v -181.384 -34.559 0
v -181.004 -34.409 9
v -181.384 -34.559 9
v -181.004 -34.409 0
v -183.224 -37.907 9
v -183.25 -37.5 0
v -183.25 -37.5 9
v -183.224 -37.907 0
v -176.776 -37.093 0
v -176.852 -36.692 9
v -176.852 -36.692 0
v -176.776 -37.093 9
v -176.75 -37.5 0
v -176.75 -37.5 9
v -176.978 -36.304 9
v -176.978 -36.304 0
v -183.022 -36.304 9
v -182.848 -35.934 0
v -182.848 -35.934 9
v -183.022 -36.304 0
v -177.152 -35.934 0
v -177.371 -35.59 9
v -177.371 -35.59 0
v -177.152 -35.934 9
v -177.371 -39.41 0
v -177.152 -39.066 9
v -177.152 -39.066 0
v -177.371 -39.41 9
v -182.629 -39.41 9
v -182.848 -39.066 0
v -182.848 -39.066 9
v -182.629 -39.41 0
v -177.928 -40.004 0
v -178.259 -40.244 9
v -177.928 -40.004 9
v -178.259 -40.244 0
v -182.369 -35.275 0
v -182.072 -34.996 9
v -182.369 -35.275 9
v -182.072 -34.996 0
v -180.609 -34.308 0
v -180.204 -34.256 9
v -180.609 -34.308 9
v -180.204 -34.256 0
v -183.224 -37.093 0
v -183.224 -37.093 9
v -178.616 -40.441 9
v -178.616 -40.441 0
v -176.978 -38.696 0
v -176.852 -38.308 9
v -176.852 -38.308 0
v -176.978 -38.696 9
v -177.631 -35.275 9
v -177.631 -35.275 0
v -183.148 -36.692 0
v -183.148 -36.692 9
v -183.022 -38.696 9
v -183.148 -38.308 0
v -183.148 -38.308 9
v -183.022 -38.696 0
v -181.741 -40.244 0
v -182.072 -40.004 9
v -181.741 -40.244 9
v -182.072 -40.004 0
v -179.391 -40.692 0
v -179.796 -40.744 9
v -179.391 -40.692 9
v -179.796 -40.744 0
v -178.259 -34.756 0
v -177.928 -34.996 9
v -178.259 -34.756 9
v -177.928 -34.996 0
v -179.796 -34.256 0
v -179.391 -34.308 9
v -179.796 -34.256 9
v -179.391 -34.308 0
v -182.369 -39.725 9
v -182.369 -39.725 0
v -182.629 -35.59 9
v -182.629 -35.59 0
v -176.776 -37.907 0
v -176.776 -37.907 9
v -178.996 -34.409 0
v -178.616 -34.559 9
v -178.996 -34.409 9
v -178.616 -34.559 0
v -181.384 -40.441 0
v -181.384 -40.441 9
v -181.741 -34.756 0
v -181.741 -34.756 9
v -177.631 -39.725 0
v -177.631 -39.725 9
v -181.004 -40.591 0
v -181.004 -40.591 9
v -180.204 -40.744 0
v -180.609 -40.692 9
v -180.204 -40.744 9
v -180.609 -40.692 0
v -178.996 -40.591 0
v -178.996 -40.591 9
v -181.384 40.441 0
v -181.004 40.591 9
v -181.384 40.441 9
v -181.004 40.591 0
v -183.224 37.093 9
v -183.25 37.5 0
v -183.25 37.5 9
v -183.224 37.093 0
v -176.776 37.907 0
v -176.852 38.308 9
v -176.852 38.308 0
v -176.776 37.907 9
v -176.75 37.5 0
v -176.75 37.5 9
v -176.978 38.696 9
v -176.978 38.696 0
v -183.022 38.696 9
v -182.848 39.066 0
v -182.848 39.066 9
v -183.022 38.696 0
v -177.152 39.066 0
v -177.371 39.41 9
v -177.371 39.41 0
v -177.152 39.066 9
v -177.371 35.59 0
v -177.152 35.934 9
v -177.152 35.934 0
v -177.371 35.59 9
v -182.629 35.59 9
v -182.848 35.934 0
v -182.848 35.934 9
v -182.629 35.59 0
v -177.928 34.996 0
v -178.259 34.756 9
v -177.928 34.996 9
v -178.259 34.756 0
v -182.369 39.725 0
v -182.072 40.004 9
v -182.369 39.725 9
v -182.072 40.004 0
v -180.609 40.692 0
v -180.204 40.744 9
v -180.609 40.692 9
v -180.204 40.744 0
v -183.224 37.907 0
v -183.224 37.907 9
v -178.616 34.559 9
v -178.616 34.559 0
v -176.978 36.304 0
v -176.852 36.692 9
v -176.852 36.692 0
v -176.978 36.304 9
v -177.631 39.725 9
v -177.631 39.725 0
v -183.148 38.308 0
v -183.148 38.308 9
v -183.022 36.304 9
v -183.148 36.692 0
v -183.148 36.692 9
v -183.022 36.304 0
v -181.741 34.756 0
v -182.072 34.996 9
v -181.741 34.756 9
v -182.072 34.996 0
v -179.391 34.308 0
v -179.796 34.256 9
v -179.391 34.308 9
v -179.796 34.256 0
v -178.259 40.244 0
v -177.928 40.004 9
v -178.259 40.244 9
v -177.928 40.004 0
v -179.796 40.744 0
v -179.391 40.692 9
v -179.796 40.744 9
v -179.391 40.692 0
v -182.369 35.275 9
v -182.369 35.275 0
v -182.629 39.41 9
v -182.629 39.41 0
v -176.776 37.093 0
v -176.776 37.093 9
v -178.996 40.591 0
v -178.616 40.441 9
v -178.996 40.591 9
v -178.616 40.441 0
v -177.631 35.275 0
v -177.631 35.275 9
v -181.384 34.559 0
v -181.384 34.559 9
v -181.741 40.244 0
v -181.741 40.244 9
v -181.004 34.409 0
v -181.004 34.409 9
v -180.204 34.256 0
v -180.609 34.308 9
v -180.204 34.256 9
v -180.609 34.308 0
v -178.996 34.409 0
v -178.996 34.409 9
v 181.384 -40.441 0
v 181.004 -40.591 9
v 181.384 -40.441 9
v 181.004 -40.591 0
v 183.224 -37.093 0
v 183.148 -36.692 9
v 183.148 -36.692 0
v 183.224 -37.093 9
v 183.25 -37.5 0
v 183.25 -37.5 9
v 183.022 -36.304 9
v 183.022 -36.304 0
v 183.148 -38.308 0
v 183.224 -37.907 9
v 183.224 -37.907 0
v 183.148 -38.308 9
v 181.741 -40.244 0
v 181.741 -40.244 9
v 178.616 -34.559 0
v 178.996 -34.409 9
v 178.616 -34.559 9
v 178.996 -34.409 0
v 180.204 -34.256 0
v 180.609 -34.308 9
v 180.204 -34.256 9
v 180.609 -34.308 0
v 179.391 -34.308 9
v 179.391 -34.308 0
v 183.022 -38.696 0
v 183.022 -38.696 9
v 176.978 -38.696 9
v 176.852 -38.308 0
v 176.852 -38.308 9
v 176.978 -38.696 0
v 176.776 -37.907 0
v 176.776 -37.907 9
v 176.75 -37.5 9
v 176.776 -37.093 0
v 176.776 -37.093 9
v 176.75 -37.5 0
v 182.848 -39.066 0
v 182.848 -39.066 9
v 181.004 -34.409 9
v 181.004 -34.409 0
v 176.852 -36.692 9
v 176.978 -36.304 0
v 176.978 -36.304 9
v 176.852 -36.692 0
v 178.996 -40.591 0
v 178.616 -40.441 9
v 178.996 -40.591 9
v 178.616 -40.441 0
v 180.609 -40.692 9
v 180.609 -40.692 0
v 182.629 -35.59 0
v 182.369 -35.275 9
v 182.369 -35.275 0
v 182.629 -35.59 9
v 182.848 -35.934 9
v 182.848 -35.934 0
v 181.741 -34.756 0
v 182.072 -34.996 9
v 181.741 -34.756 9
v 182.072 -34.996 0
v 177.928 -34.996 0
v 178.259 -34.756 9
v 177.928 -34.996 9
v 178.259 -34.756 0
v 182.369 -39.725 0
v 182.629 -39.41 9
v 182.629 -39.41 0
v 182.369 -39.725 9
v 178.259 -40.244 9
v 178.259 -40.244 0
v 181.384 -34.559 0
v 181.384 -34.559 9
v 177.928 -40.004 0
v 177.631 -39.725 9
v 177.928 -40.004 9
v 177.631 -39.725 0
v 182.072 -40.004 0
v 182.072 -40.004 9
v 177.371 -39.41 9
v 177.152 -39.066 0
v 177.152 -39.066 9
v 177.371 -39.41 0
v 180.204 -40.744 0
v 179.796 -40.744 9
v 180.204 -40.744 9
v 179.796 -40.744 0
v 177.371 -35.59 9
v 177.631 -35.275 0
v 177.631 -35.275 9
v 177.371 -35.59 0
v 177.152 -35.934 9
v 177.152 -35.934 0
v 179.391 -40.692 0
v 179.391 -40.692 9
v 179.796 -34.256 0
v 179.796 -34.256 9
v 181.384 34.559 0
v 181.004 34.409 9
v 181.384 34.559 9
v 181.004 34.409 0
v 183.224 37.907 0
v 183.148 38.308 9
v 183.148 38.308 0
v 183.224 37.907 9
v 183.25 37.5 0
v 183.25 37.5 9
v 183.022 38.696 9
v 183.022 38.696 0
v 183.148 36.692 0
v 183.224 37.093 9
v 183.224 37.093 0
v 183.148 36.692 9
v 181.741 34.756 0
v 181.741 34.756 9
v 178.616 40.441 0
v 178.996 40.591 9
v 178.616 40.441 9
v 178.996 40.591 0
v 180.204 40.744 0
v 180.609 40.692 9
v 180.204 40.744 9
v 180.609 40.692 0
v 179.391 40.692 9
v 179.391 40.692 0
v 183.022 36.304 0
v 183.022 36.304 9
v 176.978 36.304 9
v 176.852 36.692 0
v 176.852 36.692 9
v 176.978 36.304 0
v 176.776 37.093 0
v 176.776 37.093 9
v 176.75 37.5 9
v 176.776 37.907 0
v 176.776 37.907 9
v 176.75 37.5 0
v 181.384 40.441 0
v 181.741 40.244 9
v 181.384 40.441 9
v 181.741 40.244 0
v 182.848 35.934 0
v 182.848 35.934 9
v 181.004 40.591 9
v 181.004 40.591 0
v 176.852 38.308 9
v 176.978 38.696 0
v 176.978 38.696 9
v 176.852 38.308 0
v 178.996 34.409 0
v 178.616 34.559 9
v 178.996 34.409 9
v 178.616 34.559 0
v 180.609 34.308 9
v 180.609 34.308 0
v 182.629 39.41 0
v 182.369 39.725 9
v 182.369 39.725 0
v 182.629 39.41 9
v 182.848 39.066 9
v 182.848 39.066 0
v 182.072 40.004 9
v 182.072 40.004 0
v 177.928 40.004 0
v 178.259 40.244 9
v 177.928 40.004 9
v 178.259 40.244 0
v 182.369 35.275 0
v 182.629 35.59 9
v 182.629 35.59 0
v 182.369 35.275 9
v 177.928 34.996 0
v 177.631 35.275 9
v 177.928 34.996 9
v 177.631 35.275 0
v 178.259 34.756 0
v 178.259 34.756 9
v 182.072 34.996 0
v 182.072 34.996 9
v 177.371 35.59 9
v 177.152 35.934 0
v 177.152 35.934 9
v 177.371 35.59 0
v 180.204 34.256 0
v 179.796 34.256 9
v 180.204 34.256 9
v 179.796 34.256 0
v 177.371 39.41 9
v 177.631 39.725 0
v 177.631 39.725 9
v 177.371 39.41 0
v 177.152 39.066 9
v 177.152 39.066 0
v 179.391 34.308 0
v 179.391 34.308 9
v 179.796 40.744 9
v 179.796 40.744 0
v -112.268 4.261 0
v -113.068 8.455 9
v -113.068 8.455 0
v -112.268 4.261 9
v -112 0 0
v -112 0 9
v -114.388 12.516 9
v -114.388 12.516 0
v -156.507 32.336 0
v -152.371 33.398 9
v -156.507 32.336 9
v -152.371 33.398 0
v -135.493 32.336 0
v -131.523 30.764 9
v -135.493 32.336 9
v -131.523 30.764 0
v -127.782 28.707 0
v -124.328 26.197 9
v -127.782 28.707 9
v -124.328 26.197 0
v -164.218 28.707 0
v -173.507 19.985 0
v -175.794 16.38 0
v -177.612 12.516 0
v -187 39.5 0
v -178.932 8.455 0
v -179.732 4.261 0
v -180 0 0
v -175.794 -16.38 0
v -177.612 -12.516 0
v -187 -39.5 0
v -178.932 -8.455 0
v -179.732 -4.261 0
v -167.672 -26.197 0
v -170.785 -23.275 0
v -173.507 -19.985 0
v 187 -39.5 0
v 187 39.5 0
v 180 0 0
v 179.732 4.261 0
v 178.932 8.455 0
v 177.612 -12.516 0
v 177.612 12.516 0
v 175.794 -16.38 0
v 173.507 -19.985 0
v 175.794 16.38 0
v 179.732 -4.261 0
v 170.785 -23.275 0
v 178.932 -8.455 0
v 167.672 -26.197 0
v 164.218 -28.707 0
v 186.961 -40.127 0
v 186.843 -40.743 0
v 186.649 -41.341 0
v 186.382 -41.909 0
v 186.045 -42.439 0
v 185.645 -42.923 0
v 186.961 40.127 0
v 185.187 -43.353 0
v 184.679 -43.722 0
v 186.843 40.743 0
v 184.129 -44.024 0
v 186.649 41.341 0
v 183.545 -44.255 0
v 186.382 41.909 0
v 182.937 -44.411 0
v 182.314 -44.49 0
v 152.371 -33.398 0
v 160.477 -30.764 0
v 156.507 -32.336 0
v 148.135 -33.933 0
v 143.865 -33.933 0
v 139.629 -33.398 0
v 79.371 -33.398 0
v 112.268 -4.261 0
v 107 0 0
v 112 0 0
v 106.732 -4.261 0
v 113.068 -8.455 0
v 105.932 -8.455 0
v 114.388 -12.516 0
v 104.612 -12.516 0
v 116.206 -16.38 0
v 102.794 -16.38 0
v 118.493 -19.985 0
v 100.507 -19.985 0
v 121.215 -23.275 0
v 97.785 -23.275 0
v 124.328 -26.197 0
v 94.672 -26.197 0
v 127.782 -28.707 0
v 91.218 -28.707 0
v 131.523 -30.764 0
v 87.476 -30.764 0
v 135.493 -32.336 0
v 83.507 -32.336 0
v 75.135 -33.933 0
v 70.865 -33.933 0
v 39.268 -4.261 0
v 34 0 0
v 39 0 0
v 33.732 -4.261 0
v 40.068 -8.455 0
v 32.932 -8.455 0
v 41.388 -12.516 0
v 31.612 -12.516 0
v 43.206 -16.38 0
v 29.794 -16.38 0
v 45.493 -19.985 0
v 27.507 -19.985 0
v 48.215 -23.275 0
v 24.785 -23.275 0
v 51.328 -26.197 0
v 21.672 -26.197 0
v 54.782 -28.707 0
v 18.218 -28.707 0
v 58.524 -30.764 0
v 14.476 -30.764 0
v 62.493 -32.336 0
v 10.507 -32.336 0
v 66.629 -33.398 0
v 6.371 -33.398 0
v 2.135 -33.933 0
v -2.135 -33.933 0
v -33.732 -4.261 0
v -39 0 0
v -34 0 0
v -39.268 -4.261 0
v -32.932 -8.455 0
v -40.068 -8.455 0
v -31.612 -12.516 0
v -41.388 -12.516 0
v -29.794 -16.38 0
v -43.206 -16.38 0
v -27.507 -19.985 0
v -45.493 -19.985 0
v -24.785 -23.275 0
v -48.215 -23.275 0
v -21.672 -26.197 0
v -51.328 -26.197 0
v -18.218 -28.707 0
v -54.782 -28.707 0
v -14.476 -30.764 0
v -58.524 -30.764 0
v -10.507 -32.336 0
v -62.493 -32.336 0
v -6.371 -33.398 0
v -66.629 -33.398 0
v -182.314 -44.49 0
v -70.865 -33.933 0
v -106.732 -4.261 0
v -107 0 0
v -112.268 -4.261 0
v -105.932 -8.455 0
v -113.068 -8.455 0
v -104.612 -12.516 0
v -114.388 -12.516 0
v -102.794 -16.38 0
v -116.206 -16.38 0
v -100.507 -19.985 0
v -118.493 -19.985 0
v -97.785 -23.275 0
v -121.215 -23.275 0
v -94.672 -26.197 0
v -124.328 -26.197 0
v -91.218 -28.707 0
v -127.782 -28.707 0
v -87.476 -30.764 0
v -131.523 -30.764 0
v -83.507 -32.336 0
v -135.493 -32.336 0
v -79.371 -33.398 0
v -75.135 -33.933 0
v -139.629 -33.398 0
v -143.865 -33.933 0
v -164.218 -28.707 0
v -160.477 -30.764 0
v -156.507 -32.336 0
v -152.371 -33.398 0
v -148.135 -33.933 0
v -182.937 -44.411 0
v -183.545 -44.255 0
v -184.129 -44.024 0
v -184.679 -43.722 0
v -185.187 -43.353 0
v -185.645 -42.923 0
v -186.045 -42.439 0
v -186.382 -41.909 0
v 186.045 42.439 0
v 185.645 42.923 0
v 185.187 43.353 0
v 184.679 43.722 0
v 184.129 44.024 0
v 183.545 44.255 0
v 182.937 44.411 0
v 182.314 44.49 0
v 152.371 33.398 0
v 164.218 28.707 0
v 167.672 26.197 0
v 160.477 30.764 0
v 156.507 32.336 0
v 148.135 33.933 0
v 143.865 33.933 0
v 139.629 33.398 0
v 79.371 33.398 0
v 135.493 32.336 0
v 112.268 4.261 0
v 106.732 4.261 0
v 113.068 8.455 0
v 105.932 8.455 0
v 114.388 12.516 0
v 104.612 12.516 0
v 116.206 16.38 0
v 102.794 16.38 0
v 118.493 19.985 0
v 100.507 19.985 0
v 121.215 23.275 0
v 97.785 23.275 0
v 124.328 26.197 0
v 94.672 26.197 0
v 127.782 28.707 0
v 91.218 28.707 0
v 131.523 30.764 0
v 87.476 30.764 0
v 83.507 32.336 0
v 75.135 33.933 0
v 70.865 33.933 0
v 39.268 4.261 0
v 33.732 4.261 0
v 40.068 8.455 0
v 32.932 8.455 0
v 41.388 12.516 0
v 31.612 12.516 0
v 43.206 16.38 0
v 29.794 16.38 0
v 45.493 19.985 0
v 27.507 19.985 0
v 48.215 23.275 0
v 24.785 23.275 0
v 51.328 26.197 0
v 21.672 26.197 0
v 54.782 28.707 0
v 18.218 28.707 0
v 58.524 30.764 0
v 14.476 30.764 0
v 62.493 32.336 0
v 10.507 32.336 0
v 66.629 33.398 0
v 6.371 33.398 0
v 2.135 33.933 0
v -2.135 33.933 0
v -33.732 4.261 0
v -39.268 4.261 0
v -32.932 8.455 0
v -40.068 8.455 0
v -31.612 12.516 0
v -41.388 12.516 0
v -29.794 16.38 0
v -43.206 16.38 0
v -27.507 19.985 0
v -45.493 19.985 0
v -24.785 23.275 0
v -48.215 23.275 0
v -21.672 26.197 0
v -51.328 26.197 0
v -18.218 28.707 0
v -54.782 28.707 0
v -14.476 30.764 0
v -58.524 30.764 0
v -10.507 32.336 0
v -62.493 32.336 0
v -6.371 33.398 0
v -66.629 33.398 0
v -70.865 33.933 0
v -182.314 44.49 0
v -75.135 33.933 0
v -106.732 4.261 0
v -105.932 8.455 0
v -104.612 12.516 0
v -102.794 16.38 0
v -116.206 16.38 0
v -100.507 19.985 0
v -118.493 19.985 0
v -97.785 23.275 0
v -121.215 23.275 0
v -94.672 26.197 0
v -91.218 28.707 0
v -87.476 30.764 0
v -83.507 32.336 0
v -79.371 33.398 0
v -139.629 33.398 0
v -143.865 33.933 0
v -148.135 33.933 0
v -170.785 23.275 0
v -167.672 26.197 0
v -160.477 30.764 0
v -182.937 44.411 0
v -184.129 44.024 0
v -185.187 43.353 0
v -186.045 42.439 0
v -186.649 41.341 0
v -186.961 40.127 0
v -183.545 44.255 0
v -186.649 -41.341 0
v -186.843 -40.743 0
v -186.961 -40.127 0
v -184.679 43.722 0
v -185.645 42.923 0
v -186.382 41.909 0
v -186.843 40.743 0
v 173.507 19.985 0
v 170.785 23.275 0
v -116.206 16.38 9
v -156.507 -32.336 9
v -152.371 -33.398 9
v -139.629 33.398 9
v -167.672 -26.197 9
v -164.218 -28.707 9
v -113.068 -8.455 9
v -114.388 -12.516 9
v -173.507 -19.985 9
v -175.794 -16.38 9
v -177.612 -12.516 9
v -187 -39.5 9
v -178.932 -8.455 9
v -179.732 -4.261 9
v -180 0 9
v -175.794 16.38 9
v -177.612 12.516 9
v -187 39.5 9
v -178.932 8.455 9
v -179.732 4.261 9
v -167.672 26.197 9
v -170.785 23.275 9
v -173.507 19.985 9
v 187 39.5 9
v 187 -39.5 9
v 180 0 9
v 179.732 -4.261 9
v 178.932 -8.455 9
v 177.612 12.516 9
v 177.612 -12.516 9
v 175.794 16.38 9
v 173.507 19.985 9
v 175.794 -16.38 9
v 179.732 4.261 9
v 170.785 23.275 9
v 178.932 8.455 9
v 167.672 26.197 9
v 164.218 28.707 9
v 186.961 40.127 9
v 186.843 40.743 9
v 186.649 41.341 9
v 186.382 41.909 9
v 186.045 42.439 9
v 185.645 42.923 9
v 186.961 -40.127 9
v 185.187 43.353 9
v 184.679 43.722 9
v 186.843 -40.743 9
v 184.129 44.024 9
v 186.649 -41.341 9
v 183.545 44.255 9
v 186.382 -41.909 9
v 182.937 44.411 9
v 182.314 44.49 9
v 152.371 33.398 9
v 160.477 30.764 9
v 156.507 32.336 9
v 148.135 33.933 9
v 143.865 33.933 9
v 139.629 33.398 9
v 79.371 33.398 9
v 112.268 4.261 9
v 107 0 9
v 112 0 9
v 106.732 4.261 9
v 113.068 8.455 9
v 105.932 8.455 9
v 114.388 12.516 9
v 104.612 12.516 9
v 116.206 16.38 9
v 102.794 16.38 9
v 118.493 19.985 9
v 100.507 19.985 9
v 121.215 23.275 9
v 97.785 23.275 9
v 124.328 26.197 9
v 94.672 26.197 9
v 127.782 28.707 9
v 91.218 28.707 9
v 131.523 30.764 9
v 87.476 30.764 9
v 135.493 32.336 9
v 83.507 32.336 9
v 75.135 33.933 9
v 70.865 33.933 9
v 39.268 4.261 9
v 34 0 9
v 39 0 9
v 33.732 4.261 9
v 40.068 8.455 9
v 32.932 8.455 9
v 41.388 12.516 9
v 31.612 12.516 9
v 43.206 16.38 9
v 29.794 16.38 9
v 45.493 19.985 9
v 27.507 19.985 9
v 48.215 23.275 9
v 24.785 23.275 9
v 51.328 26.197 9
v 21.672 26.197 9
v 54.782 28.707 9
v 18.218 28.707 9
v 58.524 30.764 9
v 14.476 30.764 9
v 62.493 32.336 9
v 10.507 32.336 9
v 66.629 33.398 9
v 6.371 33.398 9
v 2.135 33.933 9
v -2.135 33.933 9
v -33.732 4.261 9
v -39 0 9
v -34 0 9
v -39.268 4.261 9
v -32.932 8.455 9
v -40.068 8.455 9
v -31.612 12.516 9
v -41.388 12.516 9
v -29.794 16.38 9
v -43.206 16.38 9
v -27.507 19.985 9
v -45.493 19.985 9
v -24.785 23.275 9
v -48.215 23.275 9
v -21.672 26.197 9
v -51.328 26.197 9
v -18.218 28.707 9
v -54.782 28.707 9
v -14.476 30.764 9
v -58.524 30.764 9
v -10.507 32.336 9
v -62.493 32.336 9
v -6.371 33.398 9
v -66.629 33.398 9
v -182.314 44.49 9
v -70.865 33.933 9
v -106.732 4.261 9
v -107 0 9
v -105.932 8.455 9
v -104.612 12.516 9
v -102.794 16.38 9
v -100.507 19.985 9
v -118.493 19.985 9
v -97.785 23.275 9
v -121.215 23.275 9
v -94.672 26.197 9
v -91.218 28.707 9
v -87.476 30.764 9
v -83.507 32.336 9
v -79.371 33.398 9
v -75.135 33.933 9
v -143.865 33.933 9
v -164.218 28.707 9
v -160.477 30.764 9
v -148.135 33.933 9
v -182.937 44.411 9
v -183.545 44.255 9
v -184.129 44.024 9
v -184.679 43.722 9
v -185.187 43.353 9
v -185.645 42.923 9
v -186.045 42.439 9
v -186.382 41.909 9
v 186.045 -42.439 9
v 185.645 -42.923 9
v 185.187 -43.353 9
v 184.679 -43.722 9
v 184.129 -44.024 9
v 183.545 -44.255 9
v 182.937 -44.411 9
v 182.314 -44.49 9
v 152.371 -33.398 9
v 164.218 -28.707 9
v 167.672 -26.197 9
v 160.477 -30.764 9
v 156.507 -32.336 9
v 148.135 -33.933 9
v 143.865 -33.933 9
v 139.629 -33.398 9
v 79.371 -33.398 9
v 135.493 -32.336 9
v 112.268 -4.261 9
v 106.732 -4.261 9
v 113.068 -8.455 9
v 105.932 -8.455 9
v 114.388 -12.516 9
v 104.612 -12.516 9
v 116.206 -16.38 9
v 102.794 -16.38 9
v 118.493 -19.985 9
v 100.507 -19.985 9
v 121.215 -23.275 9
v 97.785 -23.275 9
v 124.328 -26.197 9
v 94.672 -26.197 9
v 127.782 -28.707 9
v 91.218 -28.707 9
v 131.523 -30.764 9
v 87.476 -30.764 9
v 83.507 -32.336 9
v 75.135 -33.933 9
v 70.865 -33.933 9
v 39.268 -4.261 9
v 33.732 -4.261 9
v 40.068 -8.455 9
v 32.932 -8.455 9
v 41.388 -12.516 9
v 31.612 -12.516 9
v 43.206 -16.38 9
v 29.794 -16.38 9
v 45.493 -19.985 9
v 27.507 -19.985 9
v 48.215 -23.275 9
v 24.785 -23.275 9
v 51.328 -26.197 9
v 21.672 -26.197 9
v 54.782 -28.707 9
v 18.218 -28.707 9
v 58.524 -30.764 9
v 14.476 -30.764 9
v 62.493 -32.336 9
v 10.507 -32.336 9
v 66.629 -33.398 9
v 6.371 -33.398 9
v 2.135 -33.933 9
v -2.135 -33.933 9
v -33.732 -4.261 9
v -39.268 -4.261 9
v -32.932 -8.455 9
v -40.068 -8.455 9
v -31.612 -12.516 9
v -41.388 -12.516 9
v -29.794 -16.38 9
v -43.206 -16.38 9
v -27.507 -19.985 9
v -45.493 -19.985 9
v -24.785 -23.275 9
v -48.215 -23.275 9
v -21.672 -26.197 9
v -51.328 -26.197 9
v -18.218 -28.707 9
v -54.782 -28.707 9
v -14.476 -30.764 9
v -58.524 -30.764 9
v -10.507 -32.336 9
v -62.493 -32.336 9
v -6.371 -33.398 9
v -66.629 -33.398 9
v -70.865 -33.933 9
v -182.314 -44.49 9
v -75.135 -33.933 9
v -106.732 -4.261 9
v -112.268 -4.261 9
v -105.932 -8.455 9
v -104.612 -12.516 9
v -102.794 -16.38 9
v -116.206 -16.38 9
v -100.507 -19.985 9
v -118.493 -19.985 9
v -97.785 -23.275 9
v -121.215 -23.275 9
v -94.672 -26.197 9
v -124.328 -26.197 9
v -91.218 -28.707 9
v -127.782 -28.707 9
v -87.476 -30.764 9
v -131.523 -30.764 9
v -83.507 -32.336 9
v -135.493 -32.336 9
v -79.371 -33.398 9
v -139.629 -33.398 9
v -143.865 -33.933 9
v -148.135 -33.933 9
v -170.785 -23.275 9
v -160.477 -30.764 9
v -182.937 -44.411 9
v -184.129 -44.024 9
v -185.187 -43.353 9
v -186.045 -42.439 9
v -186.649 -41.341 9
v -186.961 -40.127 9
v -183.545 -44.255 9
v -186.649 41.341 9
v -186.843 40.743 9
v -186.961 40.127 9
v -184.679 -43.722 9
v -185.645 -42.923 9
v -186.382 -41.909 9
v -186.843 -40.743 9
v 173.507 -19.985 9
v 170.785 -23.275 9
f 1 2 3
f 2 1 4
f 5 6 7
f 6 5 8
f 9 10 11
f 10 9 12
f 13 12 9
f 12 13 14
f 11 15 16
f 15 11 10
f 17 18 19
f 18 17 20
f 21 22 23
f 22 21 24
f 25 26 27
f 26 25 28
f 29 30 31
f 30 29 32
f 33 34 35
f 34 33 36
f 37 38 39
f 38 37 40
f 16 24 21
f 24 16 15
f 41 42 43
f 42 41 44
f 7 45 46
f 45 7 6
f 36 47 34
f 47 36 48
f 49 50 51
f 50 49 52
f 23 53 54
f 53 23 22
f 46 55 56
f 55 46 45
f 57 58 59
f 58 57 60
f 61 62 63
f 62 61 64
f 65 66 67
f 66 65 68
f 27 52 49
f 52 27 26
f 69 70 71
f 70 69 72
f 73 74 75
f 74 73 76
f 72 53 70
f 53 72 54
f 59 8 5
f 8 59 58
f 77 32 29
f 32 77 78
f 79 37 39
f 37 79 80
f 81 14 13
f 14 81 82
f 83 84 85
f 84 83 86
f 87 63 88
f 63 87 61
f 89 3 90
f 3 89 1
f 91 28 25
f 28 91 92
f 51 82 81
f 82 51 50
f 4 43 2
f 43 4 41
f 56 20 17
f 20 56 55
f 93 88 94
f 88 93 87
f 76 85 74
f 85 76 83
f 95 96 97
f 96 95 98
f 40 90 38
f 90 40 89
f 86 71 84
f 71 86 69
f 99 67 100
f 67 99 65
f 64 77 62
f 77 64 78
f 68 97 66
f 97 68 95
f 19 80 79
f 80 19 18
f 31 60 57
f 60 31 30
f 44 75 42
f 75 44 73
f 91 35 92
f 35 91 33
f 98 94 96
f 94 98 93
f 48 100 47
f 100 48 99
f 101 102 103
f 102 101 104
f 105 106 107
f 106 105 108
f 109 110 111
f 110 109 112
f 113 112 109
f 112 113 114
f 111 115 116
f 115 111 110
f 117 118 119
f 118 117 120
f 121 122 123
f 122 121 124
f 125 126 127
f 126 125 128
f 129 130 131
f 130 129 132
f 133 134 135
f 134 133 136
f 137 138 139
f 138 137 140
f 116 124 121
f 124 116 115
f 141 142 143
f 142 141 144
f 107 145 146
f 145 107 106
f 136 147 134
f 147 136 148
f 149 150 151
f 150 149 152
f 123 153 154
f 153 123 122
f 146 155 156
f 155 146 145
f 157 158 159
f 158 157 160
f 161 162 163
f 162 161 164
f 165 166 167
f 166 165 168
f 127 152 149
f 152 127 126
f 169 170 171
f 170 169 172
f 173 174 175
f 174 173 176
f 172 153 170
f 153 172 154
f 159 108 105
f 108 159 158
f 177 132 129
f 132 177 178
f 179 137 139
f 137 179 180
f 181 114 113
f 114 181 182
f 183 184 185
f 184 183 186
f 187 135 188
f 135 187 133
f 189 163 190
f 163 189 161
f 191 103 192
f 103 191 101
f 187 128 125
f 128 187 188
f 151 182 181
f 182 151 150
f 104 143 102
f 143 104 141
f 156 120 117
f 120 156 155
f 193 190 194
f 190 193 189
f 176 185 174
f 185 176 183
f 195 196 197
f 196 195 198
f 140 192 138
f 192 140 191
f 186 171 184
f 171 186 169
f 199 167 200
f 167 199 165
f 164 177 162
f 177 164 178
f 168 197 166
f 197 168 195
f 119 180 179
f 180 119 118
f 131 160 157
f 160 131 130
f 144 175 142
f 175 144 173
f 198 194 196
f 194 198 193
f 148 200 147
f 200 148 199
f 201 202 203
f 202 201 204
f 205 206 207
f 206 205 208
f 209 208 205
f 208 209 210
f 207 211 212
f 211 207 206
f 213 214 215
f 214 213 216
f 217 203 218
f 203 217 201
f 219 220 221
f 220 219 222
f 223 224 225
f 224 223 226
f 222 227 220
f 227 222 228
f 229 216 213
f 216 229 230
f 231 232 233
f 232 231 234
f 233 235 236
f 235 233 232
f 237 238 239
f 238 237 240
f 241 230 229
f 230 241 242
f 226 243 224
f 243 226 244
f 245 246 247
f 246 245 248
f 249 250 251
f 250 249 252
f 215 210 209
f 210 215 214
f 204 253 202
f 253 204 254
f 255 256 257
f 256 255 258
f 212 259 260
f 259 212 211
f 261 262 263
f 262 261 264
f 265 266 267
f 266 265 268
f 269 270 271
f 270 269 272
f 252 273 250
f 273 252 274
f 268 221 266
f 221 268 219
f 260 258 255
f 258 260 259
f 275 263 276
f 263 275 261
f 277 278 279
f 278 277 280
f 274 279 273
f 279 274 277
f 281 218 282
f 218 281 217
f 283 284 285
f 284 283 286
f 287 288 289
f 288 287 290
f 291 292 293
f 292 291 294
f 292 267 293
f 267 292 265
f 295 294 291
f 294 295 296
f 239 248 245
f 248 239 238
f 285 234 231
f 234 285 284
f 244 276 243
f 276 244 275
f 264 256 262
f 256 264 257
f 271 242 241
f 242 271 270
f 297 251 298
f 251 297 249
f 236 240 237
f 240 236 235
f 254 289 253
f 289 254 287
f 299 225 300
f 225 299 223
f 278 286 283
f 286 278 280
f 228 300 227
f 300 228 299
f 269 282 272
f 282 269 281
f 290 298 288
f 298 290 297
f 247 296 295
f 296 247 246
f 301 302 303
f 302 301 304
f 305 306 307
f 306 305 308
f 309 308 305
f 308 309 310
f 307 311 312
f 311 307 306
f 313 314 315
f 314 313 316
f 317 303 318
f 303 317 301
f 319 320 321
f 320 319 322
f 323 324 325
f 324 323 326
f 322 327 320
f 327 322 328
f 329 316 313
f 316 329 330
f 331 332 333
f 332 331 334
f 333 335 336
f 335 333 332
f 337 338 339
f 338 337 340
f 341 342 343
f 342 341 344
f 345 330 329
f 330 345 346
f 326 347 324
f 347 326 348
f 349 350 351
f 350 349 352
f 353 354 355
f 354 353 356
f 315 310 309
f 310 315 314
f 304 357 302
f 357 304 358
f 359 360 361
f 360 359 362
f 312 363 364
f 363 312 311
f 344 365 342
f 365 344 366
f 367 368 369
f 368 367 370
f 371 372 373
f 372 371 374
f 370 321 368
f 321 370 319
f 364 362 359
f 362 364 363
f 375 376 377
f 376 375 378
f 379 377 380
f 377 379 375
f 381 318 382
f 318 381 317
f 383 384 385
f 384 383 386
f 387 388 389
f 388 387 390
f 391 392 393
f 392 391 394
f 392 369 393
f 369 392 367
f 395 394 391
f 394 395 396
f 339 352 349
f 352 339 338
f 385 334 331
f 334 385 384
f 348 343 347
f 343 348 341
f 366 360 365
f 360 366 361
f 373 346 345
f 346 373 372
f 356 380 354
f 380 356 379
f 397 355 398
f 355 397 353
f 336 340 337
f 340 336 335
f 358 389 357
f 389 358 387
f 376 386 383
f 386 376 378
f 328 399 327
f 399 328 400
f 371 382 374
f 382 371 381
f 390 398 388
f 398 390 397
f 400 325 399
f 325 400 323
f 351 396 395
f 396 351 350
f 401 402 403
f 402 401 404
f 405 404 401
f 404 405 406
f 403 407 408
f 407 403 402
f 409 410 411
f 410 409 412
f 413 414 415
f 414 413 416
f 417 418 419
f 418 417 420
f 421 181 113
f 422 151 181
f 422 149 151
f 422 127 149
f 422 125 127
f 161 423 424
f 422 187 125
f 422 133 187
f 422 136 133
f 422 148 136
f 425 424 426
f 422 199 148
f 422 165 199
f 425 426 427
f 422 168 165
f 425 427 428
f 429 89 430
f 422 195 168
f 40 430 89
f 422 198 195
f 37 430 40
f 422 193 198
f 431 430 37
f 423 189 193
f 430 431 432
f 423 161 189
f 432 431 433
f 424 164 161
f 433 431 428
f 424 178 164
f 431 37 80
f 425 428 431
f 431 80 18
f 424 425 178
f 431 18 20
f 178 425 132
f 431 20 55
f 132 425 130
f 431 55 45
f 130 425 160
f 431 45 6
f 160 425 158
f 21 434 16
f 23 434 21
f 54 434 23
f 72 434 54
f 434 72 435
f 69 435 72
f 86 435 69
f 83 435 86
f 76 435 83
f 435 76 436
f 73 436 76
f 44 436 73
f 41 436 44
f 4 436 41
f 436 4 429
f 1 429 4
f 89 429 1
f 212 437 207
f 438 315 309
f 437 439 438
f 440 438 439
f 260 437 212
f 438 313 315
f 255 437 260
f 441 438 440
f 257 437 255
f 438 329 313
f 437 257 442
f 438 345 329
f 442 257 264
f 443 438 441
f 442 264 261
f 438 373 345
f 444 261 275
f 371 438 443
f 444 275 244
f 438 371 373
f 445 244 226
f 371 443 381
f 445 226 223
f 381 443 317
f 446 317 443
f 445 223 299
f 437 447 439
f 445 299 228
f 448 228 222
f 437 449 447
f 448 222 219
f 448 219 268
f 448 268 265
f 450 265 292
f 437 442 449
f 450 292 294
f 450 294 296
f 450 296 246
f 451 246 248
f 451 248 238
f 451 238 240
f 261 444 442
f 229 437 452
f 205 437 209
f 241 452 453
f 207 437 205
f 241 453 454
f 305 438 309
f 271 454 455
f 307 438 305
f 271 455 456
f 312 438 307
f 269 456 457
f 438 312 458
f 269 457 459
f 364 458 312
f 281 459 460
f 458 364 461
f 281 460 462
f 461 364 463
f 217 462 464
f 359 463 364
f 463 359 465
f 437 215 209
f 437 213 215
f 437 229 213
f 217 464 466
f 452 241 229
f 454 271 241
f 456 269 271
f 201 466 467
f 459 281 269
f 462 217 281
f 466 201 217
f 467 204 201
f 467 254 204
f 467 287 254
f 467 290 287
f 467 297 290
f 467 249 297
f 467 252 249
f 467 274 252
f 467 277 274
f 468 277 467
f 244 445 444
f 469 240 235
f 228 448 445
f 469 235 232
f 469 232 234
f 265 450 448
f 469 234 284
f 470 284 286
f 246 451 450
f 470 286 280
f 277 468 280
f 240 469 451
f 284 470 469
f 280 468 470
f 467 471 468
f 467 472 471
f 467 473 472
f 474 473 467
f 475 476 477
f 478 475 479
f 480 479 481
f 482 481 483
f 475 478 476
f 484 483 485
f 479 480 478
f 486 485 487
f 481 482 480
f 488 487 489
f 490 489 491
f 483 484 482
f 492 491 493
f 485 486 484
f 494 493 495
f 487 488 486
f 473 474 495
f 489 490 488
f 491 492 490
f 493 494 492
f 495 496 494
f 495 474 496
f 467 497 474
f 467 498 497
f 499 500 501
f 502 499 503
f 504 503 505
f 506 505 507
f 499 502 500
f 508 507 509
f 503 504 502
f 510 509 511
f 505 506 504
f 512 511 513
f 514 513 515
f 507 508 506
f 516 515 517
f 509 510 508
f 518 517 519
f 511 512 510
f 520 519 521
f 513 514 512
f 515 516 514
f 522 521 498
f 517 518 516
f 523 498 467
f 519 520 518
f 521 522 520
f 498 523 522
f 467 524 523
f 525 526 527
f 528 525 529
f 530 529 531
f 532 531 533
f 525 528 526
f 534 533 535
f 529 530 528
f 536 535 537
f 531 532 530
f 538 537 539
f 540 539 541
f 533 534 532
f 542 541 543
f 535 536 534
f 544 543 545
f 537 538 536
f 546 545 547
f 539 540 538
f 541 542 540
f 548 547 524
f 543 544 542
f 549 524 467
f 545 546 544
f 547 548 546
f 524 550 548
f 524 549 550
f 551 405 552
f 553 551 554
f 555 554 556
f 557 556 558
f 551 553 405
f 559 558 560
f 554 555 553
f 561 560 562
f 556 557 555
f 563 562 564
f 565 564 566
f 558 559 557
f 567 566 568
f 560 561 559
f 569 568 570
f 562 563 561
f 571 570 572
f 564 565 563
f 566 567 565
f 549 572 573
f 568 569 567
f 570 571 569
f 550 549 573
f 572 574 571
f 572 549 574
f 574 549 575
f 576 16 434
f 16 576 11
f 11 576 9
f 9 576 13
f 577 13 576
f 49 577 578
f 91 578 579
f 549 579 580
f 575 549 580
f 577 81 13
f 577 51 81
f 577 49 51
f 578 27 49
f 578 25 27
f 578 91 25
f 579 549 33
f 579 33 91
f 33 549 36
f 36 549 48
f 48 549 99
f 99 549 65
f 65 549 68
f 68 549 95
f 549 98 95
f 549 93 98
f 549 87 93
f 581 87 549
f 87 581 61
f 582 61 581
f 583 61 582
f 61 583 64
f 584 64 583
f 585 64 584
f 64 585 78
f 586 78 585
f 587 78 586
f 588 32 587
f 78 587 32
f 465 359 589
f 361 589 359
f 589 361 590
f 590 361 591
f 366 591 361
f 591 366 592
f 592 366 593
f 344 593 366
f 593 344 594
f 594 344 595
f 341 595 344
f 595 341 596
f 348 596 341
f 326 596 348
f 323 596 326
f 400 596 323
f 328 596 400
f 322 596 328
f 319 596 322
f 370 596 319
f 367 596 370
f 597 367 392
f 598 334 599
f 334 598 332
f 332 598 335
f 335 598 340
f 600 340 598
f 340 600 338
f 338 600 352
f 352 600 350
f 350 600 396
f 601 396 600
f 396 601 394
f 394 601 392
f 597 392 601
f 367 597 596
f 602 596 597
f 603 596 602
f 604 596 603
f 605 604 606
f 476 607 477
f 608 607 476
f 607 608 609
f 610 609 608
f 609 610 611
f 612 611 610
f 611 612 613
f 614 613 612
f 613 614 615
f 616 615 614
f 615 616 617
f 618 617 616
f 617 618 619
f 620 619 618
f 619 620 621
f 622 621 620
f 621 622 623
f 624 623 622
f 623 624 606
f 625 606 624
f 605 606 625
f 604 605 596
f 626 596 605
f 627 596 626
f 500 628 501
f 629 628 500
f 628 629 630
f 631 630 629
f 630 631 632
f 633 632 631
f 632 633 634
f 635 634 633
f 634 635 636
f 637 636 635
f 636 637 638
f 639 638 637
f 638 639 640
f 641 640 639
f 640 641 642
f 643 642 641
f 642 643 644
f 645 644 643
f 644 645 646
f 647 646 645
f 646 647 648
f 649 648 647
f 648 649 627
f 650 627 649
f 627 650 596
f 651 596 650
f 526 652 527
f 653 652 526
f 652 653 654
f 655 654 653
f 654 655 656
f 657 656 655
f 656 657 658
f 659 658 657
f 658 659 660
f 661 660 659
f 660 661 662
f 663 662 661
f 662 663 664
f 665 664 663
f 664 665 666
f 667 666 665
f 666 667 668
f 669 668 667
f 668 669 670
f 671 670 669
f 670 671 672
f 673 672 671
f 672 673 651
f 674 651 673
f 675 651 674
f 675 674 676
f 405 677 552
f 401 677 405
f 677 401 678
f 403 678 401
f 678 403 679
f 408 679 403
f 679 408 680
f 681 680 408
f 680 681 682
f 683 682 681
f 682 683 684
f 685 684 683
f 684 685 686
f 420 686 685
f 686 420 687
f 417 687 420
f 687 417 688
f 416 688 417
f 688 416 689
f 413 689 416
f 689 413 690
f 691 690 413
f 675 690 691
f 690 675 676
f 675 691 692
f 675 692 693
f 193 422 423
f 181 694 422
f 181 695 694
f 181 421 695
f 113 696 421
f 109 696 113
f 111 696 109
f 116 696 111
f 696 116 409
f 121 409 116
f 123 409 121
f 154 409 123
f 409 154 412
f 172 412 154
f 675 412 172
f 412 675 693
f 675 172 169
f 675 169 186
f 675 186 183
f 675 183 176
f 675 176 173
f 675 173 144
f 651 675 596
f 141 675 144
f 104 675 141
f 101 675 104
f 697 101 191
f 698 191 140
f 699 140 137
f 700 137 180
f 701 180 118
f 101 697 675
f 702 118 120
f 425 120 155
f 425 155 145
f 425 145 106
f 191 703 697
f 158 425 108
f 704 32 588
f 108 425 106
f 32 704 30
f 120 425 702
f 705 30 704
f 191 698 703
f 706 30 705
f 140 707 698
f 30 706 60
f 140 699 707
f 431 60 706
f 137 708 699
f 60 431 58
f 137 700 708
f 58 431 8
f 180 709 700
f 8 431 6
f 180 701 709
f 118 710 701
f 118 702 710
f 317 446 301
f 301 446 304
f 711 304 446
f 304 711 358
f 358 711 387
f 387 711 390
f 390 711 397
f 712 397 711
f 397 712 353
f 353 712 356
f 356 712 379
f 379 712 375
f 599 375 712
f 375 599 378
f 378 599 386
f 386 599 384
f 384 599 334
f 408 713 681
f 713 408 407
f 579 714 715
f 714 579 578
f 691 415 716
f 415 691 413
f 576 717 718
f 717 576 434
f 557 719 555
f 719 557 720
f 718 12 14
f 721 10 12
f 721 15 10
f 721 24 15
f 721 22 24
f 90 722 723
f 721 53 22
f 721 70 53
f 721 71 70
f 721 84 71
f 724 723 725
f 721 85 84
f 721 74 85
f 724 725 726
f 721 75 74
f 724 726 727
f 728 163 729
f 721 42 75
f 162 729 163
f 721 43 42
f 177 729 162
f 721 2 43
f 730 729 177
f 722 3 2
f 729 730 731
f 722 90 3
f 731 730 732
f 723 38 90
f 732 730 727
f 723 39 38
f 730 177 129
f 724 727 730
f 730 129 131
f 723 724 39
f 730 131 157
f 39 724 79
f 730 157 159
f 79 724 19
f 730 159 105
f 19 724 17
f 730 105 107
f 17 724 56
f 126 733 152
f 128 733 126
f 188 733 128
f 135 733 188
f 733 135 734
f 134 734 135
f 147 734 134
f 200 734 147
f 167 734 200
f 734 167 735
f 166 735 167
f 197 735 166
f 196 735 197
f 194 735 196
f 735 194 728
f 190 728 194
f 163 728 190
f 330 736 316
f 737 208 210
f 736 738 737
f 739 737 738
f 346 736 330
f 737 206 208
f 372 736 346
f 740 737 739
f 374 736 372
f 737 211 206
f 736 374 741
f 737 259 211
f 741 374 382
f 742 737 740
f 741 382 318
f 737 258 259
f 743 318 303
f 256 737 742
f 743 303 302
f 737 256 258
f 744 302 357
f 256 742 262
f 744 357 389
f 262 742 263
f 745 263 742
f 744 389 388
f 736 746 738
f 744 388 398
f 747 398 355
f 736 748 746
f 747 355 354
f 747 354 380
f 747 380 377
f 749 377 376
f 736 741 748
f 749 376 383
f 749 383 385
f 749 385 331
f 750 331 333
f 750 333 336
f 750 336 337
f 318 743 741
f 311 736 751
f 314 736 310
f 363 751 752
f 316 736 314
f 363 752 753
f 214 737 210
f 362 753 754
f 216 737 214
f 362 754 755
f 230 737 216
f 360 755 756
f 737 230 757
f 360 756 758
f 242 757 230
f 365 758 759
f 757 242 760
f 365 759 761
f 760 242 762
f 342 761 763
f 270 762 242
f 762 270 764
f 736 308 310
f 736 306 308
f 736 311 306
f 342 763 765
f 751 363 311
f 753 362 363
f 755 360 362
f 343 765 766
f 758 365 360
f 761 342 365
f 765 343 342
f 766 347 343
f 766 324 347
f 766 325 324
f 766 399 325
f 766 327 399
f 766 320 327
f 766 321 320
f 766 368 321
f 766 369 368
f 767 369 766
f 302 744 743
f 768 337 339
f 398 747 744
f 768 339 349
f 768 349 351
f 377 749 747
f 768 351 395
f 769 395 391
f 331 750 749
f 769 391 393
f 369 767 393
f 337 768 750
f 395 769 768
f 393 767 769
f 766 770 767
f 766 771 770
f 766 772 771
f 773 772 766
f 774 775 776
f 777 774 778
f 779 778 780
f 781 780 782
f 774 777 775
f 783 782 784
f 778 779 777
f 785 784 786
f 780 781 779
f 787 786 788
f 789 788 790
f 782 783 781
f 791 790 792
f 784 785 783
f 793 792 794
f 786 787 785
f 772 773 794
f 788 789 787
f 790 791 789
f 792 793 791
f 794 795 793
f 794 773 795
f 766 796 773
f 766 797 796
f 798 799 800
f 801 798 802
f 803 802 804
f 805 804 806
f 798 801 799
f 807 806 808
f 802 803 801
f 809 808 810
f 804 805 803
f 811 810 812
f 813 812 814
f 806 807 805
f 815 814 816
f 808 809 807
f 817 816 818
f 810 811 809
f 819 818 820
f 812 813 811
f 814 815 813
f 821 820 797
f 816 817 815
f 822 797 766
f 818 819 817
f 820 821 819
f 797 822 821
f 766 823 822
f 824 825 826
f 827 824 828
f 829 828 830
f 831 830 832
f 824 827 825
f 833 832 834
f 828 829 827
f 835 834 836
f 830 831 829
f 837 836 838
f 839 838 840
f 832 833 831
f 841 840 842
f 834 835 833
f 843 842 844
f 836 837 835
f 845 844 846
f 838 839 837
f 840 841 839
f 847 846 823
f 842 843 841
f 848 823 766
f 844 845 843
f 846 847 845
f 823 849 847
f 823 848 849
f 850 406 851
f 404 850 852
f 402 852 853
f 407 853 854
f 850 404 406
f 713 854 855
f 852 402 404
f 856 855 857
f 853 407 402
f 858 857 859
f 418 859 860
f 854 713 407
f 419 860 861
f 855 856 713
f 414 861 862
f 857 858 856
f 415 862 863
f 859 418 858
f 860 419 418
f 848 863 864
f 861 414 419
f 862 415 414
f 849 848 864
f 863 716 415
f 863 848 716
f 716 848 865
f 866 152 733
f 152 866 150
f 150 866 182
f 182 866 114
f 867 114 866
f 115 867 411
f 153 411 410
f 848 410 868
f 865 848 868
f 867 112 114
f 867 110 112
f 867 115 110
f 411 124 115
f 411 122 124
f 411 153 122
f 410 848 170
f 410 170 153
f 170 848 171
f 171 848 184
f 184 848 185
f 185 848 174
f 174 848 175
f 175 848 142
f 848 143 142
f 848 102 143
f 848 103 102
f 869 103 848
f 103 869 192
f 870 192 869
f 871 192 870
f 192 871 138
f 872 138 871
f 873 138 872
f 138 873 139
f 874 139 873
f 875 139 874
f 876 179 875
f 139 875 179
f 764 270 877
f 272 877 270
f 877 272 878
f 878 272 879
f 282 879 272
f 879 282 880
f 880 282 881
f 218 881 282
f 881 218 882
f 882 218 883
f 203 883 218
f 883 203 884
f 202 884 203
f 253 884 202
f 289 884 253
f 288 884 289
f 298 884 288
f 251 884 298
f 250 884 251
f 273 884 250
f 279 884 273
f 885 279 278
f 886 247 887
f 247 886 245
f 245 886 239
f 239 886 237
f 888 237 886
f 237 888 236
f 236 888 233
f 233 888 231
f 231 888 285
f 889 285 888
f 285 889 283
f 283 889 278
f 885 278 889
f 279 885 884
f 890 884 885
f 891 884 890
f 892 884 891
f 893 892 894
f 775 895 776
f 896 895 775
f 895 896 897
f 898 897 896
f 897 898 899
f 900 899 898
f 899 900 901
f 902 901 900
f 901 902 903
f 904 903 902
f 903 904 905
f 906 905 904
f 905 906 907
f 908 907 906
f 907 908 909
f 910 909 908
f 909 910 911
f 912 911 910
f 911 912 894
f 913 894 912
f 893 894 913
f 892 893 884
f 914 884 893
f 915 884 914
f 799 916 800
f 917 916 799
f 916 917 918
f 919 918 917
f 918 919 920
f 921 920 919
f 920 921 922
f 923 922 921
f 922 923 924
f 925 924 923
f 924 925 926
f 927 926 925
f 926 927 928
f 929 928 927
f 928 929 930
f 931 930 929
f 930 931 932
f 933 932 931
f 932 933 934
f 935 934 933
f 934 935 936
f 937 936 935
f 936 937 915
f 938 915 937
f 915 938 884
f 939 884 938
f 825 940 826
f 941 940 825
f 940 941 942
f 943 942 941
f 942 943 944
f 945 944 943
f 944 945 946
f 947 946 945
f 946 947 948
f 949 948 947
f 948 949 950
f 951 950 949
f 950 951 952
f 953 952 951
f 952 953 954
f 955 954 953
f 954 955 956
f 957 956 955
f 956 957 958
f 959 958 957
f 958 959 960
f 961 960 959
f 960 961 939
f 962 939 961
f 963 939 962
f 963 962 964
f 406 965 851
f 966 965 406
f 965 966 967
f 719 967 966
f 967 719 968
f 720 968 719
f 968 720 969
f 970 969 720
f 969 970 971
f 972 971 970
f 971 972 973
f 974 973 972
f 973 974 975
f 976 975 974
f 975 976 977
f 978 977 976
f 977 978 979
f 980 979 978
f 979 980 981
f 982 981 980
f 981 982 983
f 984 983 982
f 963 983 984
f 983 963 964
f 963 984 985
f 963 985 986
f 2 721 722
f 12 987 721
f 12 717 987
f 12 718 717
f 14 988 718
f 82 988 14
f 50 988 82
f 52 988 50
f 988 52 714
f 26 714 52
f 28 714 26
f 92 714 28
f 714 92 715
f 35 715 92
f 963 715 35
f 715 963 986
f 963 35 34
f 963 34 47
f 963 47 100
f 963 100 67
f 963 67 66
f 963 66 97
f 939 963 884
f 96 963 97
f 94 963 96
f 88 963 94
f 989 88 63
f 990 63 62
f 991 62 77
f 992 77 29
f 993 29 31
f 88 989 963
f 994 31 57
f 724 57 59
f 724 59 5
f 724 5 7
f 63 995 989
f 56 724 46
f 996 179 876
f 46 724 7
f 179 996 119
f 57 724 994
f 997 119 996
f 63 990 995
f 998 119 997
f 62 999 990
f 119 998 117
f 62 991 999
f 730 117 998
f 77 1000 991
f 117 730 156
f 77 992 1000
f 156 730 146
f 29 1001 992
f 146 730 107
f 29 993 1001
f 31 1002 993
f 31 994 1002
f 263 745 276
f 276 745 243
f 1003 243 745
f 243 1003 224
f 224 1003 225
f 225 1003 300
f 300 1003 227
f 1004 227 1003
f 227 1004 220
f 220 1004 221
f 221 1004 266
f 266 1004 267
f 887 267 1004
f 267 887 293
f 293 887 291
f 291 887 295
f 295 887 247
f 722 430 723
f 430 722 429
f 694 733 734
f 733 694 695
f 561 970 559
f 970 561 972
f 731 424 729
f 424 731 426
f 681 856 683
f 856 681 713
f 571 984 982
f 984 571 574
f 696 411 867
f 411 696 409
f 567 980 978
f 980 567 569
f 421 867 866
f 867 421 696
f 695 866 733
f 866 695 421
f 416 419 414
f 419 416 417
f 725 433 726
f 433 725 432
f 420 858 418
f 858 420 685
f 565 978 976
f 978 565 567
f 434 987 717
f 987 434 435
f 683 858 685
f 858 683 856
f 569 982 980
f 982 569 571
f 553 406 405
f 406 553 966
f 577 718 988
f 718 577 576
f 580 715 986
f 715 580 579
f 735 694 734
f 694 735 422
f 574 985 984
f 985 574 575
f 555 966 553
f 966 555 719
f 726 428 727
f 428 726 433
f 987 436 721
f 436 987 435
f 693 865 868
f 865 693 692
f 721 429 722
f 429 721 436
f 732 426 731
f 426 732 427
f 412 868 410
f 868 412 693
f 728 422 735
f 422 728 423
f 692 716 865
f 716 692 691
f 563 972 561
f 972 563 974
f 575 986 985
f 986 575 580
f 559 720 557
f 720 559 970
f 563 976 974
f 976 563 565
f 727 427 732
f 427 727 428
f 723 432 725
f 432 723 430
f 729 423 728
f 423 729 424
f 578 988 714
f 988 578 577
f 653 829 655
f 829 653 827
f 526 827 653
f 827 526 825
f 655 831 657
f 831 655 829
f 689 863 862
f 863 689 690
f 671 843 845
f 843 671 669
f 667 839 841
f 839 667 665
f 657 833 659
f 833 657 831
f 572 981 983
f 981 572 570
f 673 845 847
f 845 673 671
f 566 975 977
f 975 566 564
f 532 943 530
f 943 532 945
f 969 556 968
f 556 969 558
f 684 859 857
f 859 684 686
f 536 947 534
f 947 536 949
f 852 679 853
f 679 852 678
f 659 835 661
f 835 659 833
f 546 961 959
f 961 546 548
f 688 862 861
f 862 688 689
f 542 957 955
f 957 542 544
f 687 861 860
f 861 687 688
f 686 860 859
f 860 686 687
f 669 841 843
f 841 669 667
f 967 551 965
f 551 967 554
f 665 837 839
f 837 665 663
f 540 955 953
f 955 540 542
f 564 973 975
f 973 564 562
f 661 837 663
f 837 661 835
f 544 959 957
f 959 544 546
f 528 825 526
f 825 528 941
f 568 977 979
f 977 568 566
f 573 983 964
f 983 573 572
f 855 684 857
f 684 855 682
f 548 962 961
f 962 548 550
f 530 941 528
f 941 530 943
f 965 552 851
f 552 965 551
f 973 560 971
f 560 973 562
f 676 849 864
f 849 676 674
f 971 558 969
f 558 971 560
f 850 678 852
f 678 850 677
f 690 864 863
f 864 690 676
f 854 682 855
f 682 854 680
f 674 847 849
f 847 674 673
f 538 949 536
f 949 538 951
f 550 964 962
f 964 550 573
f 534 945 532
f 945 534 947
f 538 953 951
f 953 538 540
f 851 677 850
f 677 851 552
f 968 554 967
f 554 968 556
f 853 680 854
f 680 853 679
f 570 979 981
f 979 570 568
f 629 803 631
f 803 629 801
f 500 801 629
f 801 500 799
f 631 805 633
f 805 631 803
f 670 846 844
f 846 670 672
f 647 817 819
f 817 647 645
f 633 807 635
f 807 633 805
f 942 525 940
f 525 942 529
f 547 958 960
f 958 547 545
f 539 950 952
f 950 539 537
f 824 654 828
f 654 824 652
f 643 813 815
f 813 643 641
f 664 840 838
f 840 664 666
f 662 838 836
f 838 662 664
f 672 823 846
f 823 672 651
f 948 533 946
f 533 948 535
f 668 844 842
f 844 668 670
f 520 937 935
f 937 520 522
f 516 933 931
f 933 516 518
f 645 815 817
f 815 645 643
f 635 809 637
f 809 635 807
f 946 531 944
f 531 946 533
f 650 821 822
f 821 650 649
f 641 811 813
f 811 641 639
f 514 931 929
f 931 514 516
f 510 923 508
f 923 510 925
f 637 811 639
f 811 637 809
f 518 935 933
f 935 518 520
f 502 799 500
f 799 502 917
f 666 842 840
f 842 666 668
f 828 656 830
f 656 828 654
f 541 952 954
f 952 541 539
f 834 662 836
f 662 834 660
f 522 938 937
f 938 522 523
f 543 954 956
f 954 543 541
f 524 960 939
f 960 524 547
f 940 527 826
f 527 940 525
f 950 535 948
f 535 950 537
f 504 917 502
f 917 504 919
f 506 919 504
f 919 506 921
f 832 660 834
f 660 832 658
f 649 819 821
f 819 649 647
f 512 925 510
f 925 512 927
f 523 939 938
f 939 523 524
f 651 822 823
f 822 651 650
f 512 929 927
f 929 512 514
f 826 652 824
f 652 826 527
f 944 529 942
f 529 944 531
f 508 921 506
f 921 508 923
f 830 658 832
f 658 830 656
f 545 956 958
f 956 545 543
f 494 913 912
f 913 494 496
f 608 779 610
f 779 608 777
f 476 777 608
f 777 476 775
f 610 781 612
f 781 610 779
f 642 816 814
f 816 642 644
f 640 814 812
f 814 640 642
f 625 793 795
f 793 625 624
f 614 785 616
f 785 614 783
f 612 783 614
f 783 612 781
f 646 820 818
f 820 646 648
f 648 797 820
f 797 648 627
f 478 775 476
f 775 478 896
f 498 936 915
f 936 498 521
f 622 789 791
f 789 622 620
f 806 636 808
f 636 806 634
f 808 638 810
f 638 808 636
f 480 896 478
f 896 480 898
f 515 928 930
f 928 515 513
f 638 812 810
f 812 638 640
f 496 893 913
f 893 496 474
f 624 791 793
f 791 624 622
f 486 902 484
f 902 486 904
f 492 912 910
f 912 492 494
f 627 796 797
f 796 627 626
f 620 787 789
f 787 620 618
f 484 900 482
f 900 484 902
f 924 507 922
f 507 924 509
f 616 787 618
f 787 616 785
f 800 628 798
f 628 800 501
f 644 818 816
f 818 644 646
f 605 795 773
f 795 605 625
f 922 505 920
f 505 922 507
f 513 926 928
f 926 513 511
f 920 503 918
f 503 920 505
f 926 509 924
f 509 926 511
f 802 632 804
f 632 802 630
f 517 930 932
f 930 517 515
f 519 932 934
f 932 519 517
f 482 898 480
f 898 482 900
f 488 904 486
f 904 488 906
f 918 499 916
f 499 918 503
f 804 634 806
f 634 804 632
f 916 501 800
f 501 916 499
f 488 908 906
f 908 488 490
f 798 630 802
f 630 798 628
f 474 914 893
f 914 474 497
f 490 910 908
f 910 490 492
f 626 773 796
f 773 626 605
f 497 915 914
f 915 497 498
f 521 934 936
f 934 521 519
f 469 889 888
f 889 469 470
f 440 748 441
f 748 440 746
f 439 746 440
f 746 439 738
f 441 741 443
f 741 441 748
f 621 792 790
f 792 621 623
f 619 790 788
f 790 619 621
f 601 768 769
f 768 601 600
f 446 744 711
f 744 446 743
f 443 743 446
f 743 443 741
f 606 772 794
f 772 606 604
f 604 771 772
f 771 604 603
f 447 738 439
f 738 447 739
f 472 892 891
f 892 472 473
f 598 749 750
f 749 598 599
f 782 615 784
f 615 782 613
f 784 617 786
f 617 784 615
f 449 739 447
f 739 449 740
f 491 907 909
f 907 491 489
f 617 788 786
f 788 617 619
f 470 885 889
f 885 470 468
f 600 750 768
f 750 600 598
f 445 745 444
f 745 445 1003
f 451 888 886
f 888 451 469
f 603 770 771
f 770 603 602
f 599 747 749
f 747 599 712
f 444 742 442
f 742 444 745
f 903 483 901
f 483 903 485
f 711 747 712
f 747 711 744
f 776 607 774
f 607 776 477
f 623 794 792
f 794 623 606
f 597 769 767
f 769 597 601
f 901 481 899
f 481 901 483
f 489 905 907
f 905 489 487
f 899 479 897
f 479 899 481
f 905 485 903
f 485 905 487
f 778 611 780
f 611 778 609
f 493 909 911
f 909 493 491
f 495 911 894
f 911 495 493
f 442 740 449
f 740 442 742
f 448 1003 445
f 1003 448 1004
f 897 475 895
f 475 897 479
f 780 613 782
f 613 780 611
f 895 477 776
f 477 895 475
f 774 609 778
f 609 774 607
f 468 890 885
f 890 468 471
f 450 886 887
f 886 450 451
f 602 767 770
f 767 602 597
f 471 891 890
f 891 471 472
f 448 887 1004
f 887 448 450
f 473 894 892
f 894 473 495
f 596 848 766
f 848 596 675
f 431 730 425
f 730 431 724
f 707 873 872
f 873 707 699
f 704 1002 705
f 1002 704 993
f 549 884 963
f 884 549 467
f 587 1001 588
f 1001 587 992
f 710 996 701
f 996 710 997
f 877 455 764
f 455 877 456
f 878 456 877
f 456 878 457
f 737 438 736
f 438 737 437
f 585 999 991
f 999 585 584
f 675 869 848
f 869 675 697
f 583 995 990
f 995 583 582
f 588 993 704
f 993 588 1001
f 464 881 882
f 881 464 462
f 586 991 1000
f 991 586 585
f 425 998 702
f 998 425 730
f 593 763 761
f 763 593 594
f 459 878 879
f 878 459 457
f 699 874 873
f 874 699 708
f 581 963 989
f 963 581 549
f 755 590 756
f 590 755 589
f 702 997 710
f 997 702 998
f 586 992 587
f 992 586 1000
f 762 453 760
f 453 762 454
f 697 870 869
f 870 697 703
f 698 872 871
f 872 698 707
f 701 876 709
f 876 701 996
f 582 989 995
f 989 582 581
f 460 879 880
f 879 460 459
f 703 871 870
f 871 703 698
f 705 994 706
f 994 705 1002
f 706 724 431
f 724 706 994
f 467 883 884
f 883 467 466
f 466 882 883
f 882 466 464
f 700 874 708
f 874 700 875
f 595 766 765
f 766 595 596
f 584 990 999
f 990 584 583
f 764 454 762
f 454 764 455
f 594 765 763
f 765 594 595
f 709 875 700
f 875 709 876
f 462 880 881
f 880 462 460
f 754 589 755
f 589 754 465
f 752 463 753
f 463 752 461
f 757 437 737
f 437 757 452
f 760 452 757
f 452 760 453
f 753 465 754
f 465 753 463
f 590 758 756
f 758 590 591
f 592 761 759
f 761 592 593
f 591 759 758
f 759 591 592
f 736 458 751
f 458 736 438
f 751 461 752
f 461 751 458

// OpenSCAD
$fn = 50;


difference() {
	union() {
		hull() {
			translate(v = [-182.0000000000, 39.5000000000, 0]) {
				cylinder(h = 9, r = 5);
			}
			translate(v = [182.0000000000, 39.5000000000, 0]) {
				cylinder(h = 9, r = 5);
			}
			translate(v = [-182.0000000000, -39.5000000000, 0]) {
				cylinder(h = 9, r = 5);
			}
			translate(v = [182.0000000000, -39.5000000000, 0]) {
				cylinder(h = 9, r = 5);
			}
		}
	}
	union() {
		#translate(v = [-180.0000000000, -37.5000000000, -100.0000000000]) {
			cylinder(h = 200, r = 3.2500000000);
		}
		#translate(v = [-180.0000000000, 37.5000000000, -100.0000000000]) {
			cylinder(h = 200, r = 3.2500000000);
		}
		#translate(v = [180.0000000000, -37.5000000000, -100.0000000000]) {
			cylinder(h = 200, r = 3.2500000000);
		}
		#translate(v = [180.0000000000, 37.5000000000, -100.0000000000]) {
			cylinder(h = 200, r = 3.2500000000);
		}
		#translate(v = [-146.0000000000, 0, 0]) {
			cylinder(h = 9, r = 34.0000000000);
		}
		#translate(v = [-73.0000000000, 0, 0]) {
			cylinder(h = 9, r = 34.0000000000);
		}
		#cylinder(h = 9, r = 34.0000000000);
		#translate(v = [73.0000000000, 0, 0]) {
			cylinder(h = 9, r = 34.0000000000);
		}
		#translate(v = [146.0000000000, 0, 0]) {
			cylinder(h = 9, r = 34.0000000000);
		}
	}
}
